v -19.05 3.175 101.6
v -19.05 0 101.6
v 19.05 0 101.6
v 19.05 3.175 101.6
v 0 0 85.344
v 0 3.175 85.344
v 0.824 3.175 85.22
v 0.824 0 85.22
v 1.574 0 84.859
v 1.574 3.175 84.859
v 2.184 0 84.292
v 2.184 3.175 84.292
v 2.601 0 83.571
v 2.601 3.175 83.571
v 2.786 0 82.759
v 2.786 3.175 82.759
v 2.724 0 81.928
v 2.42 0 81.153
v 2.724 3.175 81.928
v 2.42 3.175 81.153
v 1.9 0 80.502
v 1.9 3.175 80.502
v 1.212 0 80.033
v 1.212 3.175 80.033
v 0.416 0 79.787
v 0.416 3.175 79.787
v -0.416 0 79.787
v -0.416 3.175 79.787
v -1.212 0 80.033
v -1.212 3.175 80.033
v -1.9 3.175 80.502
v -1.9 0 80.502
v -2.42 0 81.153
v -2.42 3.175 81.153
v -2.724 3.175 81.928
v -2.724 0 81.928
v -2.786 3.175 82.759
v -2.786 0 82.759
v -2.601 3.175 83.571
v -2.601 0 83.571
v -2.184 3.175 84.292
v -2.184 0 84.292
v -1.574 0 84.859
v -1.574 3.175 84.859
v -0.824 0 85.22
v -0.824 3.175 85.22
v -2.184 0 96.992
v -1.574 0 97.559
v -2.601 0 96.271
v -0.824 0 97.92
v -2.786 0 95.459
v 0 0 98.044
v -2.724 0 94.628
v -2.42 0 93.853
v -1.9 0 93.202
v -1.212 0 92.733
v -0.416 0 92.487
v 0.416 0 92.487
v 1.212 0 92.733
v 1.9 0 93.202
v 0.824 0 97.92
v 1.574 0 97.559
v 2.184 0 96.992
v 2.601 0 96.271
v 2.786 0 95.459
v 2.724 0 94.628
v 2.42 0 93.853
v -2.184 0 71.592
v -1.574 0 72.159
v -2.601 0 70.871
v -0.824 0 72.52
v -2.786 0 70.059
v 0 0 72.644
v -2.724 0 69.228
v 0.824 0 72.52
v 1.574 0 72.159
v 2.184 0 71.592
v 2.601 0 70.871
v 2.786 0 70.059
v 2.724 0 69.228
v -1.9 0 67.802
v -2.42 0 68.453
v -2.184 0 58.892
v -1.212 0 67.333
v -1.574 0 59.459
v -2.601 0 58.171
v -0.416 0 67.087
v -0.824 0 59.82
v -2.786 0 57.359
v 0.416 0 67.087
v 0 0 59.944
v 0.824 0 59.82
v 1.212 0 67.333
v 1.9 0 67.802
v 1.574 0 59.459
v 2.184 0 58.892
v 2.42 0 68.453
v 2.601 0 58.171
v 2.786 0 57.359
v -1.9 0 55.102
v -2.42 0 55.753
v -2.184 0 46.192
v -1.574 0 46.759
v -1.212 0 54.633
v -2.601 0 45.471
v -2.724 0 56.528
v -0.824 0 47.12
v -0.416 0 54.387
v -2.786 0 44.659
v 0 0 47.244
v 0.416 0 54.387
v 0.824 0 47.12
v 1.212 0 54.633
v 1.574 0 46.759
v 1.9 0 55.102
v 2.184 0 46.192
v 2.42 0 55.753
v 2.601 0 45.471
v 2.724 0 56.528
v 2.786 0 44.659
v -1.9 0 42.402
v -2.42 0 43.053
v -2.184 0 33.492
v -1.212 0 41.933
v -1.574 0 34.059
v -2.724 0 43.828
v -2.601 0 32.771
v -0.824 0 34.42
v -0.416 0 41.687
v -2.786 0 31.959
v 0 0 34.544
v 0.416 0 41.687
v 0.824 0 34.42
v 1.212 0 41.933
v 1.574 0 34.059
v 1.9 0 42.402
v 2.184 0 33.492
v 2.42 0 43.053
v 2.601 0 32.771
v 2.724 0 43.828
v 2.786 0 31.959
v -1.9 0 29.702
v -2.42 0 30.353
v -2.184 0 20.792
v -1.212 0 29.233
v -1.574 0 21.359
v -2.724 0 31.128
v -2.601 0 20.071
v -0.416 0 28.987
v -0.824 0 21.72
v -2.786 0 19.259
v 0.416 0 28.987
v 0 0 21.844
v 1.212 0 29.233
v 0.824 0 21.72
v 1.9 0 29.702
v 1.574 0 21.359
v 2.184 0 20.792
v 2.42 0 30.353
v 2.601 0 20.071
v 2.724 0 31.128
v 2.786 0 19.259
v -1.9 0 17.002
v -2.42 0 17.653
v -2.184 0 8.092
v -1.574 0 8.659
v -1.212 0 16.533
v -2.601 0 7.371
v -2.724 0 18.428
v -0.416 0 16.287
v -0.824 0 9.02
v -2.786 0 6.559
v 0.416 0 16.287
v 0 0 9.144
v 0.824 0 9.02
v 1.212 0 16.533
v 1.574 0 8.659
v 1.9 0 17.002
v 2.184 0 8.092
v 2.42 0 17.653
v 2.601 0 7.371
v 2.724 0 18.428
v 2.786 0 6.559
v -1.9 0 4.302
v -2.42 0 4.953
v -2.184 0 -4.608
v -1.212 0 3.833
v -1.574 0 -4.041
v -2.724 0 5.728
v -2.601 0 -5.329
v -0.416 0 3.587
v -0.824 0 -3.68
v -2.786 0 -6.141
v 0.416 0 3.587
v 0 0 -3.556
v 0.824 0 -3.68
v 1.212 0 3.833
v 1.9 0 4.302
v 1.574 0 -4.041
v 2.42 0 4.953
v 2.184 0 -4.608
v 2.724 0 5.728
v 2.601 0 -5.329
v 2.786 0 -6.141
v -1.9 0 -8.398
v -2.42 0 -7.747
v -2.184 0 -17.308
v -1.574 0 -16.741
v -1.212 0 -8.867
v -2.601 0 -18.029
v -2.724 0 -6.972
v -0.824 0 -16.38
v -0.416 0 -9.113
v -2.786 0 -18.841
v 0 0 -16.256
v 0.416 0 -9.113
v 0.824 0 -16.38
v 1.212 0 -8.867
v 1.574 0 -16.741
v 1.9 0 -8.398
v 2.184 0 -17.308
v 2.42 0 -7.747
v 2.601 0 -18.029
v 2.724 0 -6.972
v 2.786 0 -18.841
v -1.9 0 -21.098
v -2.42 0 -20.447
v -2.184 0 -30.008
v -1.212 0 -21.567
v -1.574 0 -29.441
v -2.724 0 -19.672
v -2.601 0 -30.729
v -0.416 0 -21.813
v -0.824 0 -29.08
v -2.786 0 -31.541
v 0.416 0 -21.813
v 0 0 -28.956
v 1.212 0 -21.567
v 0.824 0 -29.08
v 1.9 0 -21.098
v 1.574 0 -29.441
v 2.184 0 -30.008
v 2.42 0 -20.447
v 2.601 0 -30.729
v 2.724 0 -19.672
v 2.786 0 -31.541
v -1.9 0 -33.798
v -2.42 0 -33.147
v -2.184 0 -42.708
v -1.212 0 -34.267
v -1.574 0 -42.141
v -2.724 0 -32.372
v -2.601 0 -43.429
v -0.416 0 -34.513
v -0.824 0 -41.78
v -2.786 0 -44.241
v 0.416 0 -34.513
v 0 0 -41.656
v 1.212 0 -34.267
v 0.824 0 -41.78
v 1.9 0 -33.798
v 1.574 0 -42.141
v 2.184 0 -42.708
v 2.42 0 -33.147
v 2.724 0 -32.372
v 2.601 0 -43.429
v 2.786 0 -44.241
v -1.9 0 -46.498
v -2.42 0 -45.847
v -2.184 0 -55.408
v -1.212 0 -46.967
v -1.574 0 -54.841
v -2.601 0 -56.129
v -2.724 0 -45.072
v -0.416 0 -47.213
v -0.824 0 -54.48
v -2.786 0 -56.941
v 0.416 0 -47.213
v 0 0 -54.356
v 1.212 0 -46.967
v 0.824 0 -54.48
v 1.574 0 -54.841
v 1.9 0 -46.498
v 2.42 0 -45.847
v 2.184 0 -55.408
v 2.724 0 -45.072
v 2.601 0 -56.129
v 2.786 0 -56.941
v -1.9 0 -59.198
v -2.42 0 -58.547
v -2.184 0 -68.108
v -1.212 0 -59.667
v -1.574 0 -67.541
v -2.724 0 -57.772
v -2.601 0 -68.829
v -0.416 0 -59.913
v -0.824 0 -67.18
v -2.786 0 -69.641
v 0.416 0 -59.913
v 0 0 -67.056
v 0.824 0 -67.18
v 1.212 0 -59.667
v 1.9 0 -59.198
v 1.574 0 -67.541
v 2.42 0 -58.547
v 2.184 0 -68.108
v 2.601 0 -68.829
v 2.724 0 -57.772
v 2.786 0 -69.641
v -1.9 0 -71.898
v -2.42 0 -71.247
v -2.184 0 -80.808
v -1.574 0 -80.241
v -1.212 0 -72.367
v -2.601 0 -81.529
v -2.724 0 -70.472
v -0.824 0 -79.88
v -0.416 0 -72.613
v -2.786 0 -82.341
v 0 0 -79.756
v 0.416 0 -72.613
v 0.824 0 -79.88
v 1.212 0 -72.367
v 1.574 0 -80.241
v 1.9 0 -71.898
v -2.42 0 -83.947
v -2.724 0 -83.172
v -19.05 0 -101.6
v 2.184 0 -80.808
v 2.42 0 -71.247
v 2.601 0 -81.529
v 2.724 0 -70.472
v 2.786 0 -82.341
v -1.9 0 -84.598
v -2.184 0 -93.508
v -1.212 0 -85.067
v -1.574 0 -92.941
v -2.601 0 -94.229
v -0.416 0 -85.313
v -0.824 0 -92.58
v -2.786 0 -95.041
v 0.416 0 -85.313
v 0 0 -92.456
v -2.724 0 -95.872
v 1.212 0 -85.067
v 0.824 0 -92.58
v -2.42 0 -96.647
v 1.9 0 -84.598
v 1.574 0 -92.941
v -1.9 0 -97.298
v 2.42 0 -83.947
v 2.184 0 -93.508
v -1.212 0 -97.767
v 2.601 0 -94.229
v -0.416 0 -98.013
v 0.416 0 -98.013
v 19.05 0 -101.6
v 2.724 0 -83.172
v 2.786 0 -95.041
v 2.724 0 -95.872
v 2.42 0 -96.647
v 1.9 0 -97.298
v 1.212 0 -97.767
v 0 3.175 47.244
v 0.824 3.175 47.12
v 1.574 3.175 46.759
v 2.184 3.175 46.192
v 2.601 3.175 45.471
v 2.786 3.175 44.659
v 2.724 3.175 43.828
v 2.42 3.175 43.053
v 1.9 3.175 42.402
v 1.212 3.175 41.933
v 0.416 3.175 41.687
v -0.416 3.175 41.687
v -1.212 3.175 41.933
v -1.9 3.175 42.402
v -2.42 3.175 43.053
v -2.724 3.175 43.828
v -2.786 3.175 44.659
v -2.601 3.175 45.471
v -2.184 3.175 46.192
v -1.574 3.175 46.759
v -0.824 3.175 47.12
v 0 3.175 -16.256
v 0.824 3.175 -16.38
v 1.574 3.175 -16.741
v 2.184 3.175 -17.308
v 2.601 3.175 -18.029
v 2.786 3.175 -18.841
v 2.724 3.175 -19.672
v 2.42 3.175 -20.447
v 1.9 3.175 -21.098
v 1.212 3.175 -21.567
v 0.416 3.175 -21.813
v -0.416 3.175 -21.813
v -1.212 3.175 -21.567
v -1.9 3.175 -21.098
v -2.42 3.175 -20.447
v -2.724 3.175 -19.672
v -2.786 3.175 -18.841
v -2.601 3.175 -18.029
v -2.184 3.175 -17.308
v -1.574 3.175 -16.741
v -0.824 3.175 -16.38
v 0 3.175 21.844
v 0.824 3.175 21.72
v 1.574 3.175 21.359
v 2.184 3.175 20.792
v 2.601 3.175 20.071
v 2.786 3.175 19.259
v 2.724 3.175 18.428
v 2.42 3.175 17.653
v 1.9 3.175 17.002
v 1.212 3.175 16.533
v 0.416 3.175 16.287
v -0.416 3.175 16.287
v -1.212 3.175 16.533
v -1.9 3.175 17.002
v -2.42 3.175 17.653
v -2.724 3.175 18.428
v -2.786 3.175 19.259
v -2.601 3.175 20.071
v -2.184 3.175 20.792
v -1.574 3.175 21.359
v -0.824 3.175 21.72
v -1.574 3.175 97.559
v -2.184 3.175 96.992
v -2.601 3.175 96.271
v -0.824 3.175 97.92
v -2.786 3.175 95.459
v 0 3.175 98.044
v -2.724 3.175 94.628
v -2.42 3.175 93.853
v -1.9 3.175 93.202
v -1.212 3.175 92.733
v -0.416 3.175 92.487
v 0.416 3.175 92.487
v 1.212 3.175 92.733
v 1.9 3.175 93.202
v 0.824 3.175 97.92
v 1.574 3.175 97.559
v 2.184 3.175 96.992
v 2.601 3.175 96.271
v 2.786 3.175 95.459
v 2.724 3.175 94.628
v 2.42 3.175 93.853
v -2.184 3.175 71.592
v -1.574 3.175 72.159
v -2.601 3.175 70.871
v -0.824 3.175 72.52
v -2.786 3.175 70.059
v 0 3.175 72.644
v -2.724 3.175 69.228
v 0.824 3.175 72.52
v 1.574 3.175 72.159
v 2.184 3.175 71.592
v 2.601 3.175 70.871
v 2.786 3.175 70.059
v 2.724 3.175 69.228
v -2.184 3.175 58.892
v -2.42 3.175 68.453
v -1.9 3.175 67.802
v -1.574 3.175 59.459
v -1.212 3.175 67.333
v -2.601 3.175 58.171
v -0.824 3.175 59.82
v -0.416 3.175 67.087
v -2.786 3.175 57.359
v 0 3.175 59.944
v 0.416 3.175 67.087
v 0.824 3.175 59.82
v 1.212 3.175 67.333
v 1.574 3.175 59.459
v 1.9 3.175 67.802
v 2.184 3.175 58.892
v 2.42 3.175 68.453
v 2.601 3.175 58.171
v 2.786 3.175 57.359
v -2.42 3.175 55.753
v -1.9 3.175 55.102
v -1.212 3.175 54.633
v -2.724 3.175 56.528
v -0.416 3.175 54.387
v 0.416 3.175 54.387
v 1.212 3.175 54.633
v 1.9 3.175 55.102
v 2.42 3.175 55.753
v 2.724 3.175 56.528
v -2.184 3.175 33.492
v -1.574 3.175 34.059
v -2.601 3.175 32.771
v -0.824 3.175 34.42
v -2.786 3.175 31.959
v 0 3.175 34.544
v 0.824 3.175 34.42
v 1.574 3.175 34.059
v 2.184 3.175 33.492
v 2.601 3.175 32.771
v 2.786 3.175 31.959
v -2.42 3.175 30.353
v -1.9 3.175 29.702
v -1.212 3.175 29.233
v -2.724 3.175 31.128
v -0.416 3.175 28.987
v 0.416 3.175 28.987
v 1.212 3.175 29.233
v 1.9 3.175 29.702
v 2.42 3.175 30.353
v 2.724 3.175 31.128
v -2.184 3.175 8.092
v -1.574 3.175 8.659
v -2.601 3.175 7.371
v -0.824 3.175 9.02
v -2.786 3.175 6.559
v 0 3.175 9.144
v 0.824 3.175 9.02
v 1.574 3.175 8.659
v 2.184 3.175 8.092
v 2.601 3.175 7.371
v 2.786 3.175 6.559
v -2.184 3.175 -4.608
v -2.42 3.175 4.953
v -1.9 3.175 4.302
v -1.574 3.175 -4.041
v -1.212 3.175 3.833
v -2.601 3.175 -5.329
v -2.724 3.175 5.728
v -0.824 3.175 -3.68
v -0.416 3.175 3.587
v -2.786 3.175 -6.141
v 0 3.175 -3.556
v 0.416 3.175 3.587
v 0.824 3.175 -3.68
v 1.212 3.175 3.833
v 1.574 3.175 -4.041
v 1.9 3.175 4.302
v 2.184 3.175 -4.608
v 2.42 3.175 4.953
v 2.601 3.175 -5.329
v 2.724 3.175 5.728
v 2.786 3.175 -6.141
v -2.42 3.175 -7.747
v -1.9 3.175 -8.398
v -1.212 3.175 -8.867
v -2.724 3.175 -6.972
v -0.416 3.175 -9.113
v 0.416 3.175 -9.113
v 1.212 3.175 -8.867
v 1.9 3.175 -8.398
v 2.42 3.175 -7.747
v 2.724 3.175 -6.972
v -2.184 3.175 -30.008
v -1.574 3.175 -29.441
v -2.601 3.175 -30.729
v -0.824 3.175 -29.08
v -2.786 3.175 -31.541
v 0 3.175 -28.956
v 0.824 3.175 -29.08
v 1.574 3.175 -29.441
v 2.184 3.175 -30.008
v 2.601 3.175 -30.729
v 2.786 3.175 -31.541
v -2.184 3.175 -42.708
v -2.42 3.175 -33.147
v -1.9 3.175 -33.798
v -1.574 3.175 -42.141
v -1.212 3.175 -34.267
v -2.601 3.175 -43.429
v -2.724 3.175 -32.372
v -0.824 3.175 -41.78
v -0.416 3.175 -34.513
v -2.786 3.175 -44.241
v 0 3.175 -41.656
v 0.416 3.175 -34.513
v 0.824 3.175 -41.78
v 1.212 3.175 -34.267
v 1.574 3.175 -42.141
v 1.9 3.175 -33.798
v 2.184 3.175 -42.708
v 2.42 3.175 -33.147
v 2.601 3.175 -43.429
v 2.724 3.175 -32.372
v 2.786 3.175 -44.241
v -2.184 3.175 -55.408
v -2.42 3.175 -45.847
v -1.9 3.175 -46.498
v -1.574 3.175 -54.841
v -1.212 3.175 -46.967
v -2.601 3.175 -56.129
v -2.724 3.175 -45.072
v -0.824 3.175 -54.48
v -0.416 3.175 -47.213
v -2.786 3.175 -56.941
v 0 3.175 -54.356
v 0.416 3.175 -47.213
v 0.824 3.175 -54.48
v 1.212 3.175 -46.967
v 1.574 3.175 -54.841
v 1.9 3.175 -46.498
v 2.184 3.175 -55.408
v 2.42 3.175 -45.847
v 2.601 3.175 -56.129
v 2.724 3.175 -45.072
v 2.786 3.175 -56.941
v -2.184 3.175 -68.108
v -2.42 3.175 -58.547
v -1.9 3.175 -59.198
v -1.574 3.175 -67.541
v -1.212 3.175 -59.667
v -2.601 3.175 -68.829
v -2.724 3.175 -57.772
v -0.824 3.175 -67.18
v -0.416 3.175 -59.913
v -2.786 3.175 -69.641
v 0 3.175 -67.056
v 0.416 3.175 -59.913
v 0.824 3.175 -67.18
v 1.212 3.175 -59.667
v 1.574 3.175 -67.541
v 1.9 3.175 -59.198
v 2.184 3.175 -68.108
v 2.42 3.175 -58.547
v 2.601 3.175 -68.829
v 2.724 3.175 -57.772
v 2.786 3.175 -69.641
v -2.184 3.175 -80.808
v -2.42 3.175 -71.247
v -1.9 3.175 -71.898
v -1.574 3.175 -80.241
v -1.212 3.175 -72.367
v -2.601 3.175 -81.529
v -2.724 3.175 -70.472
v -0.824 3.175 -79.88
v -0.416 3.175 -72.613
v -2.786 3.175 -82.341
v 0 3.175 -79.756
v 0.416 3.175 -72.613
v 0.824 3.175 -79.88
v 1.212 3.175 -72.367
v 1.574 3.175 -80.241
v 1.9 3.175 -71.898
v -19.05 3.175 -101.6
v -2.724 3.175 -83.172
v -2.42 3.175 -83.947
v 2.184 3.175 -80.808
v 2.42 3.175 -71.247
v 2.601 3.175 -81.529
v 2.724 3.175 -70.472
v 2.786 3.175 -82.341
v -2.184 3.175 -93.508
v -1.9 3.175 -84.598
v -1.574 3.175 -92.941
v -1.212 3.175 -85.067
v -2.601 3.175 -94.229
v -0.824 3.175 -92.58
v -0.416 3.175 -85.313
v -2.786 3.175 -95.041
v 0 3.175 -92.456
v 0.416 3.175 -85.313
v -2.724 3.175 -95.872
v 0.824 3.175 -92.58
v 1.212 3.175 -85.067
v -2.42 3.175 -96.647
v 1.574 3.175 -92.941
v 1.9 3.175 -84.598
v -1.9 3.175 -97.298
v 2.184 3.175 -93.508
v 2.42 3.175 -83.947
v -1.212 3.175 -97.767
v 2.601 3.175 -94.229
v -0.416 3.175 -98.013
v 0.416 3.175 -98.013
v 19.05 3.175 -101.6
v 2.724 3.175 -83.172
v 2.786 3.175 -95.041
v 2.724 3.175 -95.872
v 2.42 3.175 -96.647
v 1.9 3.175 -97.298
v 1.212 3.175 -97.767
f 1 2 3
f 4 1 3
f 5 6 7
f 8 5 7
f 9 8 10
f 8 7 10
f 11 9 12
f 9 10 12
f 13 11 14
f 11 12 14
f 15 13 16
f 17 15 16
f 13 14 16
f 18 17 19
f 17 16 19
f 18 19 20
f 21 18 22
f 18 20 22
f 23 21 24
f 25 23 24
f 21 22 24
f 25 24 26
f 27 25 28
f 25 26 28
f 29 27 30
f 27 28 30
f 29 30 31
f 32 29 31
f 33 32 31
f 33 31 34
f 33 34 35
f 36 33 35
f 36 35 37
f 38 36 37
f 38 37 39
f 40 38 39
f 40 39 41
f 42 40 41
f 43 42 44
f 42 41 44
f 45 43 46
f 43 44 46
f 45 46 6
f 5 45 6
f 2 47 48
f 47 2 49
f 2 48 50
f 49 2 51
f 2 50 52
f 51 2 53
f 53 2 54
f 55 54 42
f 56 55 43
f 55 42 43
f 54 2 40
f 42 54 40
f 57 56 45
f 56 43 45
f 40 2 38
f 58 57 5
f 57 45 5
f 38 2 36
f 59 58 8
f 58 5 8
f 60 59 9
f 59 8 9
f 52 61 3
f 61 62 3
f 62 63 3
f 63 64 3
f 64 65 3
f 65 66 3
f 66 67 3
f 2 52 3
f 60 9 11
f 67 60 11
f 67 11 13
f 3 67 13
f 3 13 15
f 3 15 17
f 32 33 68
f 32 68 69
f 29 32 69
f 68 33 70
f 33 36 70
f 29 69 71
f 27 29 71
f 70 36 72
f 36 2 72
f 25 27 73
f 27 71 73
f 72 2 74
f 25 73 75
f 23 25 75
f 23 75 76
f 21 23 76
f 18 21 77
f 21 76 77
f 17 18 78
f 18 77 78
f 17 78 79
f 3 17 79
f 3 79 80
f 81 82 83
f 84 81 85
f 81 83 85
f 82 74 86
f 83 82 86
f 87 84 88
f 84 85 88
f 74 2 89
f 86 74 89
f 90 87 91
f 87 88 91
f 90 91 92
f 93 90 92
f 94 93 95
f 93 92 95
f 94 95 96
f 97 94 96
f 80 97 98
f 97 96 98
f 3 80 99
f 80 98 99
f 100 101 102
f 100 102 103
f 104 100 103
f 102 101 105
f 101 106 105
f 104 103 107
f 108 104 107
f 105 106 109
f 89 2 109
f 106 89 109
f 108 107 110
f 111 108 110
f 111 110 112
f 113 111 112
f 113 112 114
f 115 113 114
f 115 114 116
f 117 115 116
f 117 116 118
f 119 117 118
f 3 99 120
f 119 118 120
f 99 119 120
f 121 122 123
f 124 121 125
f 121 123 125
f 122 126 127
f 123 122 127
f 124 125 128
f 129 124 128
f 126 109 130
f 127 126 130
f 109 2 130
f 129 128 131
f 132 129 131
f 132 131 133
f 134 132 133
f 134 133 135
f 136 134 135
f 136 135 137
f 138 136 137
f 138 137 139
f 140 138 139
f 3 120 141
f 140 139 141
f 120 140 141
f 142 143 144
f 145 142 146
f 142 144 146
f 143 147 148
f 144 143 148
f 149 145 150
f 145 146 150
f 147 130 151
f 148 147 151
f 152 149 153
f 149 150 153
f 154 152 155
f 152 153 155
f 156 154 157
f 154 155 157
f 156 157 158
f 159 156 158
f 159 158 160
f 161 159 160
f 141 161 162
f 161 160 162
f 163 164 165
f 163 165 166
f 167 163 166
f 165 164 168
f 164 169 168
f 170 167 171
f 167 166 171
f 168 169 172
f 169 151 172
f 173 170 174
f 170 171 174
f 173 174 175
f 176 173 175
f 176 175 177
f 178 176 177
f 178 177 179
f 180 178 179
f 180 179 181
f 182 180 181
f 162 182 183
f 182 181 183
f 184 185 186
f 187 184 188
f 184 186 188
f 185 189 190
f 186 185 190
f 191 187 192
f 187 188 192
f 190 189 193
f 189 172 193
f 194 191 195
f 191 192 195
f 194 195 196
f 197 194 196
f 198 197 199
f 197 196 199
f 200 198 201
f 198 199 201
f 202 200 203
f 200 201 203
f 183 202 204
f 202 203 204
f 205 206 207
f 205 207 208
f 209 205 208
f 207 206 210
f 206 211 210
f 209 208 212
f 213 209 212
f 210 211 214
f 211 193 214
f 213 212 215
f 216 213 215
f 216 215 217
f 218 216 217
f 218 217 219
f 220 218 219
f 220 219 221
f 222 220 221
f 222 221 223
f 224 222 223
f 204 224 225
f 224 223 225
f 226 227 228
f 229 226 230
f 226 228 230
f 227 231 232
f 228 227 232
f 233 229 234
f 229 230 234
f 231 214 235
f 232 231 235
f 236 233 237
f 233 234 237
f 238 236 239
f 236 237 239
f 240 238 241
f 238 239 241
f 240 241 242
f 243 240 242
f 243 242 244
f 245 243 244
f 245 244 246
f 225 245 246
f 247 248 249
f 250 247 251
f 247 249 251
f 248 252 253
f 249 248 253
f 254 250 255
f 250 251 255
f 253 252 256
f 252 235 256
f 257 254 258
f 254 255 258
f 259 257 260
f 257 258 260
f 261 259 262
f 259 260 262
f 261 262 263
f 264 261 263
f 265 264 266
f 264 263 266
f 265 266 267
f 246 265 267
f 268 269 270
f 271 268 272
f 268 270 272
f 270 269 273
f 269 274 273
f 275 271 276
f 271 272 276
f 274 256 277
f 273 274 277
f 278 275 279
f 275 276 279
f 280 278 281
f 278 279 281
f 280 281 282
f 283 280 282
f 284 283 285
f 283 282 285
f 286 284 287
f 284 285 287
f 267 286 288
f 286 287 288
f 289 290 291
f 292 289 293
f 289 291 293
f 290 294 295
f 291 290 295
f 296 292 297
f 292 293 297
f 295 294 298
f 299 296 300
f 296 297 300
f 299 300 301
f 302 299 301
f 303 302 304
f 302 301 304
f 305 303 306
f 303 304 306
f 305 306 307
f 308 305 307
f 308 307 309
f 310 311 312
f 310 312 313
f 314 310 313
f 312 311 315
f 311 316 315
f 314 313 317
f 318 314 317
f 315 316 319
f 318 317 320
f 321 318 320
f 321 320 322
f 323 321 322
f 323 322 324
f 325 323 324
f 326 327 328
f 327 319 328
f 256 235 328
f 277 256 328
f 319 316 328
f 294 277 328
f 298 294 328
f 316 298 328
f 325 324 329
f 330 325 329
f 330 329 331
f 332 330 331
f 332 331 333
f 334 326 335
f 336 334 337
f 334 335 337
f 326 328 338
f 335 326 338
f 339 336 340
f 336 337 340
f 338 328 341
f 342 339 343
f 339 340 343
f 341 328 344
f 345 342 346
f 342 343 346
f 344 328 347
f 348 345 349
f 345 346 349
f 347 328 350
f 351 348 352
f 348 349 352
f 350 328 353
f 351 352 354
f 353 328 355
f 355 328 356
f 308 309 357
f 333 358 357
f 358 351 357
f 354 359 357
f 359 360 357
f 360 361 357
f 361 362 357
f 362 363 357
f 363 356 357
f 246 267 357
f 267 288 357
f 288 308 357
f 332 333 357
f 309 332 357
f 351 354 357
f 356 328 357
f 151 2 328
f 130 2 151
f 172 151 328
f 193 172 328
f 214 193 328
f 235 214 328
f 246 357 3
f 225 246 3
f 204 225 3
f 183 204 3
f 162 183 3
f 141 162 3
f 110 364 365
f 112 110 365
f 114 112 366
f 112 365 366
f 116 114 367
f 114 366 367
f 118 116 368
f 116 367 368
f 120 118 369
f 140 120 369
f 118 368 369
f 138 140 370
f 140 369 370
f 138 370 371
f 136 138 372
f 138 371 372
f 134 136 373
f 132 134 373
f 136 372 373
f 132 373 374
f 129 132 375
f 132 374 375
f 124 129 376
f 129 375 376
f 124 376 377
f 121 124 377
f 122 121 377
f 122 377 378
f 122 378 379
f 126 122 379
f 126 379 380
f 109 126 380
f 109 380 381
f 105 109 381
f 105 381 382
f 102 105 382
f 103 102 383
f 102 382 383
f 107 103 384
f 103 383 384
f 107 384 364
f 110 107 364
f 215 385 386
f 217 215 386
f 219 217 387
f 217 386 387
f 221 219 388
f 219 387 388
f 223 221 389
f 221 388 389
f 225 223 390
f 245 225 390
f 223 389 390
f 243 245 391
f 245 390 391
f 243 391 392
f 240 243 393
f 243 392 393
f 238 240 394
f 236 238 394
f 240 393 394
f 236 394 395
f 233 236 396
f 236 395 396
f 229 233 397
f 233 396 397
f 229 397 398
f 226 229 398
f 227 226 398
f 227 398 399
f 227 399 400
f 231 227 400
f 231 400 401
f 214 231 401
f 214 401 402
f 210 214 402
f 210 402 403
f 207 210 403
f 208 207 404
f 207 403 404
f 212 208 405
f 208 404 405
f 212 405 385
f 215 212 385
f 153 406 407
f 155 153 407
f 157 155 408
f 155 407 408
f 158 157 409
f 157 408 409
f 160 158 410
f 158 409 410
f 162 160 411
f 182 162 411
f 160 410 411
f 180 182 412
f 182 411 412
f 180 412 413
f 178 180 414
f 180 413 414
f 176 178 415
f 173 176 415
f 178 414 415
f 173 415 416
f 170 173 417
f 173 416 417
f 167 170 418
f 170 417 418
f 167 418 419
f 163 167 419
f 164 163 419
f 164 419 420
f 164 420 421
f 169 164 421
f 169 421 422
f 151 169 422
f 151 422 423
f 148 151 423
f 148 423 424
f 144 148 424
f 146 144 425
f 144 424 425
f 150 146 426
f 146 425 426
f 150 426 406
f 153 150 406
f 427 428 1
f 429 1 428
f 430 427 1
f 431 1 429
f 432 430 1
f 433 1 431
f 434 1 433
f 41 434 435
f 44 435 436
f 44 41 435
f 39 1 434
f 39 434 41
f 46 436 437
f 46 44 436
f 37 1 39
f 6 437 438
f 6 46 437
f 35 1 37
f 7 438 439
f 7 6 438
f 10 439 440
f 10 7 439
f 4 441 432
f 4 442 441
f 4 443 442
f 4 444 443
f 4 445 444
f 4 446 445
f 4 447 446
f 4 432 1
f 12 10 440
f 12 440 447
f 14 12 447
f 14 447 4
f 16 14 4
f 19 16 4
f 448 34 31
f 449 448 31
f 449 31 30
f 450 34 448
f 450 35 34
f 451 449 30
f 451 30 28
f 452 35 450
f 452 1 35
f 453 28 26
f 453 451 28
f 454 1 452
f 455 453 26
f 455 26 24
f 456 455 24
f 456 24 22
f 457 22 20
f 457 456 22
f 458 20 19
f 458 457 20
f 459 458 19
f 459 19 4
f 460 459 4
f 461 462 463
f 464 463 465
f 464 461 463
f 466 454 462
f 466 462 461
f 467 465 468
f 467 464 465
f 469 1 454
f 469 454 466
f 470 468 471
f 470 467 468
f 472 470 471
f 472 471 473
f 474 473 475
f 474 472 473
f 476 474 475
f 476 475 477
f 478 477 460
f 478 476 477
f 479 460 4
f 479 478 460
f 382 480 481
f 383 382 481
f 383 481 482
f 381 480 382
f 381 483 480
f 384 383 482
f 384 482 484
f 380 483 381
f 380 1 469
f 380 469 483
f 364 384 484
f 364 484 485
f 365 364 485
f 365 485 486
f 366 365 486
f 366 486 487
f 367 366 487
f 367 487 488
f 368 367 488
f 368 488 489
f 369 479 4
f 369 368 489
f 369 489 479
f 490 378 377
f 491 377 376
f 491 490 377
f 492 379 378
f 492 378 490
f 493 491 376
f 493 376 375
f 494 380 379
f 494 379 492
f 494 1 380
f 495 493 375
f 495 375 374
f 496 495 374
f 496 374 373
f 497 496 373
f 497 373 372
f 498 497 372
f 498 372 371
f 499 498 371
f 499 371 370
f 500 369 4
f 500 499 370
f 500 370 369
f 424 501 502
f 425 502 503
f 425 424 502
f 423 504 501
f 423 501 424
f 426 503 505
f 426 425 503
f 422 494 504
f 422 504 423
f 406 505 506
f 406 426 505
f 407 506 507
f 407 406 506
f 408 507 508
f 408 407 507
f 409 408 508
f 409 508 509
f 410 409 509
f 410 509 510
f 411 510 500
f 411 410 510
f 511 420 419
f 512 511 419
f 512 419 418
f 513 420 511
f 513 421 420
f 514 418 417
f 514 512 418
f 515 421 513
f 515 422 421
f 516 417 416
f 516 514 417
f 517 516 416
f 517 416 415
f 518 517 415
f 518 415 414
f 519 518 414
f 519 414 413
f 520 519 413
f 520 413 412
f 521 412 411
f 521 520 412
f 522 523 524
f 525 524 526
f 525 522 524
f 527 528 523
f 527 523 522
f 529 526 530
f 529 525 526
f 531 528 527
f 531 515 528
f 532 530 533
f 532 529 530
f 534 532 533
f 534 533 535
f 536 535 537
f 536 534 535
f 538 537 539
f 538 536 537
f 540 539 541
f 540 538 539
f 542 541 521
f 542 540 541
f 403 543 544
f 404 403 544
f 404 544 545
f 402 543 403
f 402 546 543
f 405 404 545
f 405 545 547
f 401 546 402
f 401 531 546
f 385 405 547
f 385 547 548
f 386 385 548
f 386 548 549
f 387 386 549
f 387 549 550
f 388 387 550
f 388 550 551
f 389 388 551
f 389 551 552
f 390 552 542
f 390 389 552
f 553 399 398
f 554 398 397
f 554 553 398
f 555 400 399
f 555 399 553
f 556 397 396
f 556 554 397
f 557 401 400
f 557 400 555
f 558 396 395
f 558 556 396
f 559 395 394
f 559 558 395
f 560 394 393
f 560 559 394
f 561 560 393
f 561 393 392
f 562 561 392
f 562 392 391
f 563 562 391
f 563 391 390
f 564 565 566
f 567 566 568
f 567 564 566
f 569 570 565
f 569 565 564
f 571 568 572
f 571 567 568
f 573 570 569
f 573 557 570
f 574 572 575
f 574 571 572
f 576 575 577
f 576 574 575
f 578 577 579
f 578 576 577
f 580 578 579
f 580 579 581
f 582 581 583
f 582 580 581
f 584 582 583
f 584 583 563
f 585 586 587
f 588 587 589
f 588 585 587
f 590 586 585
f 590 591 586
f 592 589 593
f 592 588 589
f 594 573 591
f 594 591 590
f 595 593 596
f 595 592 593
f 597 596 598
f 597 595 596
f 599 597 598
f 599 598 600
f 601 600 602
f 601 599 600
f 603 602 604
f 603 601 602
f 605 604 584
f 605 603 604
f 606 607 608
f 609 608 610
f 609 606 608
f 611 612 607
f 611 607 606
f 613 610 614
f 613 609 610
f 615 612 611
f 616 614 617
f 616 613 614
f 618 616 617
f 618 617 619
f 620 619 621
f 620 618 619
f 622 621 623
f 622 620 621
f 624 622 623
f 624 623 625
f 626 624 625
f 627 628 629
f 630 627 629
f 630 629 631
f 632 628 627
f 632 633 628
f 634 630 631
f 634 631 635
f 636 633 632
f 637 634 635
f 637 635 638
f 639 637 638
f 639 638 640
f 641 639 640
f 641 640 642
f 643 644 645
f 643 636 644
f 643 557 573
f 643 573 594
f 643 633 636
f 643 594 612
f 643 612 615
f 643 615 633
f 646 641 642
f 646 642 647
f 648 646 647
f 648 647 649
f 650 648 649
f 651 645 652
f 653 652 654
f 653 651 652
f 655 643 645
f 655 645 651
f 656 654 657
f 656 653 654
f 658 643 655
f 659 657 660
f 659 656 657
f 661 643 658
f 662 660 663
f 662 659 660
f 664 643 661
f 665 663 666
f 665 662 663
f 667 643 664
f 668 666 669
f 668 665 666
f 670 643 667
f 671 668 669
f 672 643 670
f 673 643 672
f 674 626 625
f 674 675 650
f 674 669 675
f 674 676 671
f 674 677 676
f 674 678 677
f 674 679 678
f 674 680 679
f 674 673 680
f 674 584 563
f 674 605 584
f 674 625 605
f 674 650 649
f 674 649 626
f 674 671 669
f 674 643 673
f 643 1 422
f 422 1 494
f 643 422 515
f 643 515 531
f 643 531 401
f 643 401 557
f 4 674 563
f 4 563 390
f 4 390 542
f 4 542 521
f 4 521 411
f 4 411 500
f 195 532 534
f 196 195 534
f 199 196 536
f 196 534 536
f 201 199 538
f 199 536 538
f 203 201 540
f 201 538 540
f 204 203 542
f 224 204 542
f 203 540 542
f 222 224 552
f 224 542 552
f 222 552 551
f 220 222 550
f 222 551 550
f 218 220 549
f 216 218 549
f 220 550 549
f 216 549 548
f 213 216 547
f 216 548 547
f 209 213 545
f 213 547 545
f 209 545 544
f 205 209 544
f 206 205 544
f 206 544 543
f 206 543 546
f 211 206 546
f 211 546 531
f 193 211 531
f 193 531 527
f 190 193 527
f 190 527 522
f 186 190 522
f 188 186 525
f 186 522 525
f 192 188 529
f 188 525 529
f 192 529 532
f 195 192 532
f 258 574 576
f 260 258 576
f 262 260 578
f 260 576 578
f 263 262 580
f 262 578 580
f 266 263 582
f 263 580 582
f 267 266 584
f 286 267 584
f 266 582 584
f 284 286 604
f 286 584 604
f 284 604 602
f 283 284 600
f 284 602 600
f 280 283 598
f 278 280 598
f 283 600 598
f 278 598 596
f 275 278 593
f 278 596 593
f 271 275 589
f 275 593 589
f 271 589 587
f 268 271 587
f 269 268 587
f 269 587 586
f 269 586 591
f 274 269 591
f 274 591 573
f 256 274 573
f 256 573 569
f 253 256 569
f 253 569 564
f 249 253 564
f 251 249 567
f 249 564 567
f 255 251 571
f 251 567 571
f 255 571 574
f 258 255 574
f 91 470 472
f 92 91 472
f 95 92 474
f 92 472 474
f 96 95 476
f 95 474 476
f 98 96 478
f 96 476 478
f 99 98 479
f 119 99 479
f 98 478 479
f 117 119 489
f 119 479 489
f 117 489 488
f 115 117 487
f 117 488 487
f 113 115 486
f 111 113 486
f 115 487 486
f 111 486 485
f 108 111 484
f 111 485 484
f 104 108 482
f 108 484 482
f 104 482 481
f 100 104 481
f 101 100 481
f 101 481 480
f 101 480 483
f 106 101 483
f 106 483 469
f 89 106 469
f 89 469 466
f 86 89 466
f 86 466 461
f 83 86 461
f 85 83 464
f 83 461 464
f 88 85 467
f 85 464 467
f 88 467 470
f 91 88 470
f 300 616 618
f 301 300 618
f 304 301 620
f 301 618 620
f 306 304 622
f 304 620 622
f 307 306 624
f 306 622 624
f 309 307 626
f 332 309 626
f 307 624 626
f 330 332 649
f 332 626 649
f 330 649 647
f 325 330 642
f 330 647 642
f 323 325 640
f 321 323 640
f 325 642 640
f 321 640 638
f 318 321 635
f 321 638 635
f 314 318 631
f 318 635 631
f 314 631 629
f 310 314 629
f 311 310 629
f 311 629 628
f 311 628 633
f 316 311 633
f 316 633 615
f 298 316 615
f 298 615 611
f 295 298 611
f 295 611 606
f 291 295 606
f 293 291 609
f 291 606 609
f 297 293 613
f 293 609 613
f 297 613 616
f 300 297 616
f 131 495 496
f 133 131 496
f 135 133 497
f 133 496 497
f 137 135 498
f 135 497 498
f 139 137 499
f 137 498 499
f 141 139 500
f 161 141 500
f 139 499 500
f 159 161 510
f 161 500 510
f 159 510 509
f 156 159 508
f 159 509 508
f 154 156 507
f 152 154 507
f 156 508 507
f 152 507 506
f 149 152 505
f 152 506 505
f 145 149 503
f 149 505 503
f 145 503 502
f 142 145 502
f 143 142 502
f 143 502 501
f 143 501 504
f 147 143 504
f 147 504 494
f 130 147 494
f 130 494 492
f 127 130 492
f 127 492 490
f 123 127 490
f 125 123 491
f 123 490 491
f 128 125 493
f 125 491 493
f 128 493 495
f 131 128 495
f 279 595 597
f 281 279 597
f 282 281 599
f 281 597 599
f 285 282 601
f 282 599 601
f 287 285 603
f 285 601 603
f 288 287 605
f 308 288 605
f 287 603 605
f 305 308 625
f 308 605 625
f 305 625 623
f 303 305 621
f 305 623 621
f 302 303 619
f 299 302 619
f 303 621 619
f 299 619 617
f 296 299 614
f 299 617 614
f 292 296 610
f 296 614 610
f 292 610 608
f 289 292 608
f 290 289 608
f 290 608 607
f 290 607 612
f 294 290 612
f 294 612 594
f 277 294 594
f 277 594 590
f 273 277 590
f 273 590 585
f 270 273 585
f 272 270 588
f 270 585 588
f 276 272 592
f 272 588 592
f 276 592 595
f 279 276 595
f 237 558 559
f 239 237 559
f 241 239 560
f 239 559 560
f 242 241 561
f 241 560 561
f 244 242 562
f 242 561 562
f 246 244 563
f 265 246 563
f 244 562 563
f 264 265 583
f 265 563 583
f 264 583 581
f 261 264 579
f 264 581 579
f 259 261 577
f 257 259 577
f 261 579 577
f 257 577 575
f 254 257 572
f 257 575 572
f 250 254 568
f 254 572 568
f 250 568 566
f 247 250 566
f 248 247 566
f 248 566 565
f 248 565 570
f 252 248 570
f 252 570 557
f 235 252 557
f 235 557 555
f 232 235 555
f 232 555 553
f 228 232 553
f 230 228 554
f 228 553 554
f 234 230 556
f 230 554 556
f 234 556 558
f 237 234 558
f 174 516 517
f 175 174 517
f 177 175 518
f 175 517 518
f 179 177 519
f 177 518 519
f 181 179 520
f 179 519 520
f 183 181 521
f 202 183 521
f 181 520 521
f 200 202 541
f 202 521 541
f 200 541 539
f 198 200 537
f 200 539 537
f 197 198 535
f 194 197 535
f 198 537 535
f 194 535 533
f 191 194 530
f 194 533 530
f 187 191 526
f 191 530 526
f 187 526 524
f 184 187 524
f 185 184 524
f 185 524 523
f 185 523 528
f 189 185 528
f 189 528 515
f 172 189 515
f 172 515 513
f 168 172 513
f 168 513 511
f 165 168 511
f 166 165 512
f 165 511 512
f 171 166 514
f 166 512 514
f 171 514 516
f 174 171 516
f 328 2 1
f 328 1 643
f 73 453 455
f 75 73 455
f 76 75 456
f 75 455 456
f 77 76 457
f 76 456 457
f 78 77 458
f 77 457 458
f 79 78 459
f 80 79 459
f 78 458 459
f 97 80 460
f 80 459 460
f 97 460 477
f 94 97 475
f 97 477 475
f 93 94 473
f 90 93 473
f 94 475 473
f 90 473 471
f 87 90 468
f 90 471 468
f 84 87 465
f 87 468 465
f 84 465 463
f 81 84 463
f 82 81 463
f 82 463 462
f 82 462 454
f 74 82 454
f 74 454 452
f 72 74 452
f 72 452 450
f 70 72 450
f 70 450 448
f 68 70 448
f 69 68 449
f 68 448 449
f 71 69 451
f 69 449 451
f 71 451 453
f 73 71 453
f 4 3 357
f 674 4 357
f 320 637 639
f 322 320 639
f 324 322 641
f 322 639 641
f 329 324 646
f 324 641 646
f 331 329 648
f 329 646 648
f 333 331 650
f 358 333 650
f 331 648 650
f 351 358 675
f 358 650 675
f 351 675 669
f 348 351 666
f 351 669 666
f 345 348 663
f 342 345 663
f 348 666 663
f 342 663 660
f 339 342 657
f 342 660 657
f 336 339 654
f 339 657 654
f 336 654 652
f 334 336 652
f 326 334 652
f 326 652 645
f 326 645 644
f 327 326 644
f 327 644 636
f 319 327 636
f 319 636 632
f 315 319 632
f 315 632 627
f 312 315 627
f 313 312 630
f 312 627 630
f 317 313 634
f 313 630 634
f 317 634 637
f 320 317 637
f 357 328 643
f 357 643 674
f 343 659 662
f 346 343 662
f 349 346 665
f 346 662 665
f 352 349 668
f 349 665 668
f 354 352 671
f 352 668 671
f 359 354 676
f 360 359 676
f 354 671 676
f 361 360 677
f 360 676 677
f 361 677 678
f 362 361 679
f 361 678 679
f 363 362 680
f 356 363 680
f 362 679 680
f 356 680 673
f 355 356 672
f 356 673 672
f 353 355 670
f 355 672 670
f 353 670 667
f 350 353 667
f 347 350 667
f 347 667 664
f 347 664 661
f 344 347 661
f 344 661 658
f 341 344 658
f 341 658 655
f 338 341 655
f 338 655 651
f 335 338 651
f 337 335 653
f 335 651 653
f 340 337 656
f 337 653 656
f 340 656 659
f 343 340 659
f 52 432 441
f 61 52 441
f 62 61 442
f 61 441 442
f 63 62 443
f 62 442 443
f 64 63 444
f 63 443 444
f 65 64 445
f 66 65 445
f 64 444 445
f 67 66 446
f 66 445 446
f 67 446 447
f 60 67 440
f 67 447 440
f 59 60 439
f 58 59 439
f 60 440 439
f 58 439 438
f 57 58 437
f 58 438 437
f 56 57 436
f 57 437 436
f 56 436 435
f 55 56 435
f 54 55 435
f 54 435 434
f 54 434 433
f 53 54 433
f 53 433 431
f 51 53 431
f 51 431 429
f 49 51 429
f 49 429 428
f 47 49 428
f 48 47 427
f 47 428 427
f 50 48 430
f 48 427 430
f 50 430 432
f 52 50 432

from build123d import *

# Parameters (mm, degrees)
SKETCH2_W           = 38.1
SKETCH2_H           = 203.2
BOSS_EXTRUDE1_DEPTH = 3.175
SKETCH3_R           = 2.794
CUT_EXTRUDE1_DEPTH  = 3.175
LPATTERN1_COUNT     = 16
LPATTERN1_PITCH     = 12.7


with BuildPart() as part:
    # Sketch2 → Boss-Extrude1 (new body)
    with BuildSketch(Plane(origin=(0, 0, 0), x_dir=(1, 0, 0), z_dir=(0, 1, 0))):
        Rectangle(SKETCH2_W, SKETCH2_H)
    extrude(amount=BOSS_EXTRUDE1_DEPTH)

    # Sketch3 → Cut-Extrude1 (cut)
    with BuildSketch(Plane(origin=(0, 3.175, 0), x_dir=(1, 0, 0), z_dir=(0, 1, 0))):
        with Locations(Location((0, -95.25, 0), (0, 0, 270))):
            Circle(SKETCH3_R)
    cut_extrude1 = extrude(amount=-CUT_EXTRUDE1_DEPTH, mode=Mode.SUBTRACT)

    # LPattern1: Cut-Extrude1 ×16
    with Locations(*[(0, 0, -i * LPATTERN1_PITCH) for i in range(1, LPATTERN1_COUNT)]):
        add(cut_extrude1, mode=Mode.SUBTRACT)


solid = part.part
